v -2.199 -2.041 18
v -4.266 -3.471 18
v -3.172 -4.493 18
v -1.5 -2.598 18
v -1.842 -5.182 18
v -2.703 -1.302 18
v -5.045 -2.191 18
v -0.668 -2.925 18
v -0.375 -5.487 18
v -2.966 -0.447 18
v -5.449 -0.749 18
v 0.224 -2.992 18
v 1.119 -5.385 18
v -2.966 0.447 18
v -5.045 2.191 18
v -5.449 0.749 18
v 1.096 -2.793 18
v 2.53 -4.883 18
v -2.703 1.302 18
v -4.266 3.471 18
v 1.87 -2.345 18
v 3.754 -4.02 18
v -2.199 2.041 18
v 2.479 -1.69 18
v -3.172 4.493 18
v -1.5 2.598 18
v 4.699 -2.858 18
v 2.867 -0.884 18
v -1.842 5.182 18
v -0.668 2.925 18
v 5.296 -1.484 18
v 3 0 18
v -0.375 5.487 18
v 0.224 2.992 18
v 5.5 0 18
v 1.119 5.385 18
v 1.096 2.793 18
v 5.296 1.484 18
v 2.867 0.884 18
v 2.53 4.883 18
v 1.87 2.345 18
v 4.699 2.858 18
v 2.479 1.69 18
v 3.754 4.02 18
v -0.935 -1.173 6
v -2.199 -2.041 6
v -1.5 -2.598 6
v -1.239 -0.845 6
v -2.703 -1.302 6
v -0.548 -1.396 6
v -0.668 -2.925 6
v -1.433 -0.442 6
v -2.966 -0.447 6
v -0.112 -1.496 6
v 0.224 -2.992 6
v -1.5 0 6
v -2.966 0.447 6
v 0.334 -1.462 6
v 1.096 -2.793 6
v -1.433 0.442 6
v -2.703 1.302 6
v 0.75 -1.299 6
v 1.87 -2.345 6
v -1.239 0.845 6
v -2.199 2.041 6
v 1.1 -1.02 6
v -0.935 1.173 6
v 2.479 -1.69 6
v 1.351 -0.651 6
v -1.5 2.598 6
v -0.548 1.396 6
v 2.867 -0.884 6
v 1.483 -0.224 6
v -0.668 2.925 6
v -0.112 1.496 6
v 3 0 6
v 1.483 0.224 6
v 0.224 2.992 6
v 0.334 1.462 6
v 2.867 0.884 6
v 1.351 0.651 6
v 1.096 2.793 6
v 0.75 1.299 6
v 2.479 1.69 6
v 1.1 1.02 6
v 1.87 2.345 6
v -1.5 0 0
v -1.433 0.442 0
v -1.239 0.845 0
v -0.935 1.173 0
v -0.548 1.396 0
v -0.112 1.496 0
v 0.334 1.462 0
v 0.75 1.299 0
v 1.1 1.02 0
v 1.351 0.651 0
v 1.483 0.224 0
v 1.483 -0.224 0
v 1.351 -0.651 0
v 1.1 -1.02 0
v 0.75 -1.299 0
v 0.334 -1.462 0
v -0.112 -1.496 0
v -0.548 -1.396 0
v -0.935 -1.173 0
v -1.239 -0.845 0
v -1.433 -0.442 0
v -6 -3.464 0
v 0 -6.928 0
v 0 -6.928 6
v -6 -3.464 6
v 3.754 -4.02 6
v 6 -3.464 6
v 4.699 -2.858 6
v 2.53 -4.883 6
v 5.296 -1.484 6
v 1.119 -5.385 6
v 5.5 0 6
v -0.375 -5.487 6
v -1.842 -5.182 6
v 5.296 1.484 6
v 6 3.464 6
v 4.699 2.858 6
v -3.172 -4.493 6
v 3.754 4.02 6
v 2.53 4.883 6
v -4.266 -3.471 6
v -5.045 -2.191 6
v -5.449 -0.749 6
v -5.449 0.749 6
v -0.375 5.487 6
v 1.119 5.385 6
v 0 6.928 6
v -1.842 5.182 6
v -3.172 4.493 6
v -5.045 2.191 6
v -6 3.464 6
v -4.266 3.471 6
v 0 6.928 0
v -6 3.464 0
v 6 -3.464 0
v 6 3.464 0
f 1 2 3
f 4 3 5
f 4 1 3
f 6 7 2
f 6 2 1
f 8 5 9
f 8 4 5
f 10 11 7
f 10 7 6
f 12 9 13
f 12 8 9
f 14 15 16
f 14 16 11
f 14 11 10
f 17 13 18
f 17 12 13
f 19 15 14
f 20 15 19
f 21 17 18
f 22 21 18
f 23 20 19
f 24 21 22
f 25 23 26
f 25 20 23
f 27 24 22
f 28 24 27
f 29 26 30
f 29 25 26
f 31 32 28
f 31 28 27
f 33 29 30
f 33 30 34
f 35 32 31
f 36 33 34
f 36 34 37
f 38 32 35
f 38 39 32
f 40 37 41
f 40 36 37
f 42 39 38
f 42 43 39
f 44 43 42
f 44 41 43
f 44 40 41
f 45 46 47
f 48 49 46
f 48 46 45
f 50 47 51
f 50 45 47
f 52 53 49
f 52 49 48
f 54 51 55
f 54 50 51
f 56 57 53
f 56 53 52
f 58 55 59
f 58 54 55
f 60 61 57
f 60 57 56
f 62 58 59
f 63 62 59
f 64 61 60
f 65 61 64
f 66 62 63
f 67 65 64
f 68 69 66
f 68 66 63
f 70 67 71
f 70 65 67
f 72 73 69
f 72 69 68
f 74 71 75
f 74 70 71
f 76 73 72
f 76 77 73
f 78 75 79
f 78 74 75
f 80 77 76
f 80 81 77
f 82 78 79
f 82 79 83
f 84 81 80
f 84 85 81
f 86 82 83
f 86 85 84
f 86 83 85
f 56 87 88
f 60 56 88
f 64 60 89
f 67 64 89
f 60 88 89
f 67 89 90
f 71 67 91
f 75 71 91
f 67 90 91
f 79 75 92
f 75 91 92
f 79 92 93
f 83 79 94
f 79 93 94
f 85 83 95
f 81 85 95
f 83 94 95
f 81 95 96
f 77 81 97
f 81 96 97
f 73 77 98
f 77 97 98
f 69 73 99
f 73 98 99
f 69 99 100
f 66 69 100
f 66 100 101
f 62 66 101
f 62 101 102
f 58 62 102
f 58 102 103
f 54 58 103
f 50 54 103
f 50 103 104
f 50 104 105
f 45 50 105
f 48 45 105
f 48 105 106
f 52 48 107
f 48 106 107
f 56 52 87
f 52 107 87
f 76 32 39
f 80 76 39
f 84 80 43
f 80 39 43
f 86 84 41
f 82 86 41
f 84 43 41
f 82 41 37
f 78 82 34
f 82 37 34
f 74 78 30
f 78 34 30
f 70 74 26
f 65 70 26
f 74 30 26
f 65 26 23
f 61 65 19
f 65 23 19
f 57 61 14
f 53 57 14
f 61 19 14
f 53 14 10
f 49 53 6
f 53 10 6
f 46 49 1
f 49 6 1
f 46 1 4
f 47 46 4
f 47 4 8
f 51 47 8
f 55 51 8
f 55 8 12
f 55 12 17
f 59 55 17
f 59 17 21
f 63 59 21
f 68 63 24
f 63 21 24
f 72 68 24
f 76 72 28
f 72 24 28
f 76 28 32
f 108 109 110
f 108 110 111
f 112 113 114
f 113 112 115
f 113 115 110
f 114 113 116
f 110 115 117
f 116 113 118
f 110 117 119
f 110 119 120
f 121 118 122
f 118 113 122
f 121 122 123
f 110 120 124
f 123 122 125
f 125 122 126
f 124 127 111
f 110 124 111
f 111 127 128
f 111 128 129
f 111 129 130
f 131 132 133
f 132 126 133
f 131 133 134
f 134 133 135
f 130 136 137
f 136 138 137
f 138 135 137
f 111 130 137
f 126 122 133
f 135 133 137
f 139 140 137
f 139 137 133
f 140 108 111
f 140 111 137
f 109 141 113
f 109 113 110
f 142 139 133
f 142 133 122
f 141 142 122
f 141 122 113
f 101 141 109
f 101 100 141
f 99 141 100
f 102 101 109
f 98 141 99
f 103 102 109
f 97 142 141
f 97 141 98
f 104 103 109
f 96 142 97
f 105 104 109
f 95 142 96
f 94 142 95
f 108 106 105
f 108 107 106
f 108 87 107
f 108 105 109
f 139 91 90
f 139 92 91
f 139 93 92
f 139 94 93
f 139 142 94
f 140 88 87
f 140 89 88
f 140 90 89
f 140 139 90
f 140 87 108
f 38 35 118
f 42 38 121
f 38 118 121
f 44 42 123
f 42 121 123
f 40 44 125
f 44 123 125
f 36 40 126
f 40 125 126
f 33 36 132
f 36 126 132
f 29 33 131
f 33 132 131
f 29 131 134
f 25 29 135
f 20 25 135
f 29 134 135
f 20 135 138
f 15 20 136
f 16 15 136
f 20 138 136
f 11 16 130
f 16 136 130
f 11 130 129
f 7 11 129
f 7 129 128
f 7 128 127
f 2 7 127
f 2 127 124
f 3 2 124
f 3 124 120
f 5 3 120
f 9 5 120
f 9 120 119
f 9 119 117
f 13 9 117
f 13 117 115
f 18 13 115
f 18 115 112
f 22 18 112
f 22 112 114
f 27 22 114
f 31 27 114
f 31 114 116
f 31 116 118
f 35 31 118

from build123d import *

# Parameters (mm, degrees)
CROQUIS2_R              = 5.5
SALIENTE_EXTRUIR1_DEPTH = 18
SALIENTE_EXTRUIR2_DEPTH = 6
CROQUIS4_R              = 3
CORTAR_EXTRUIR1_DEPTH   = 12
CROQUIS5_R              = 1.5
CORTAR_EXTRUIR2_DEPTH   = 6


with BuildPart() as part:
    # Croquis2 → Saliente-Extruir1 (new body)
    with BuildSketch(Plane.XY):
        Circle(CROQUIS2_R)
    extrude(amount=SALIENTE_EXTRUIR1_DEPTH)

    # Croquis3 → Saliente-Extruir2 (add)
    with BuildSketch(Plane(origin=(0, 0, 0), x_dir=(-1, 0, 0), z_dir=(0, 0, -1))):
        Polygon((0, 6.92820323), (-6, 3.464101615), (-6, -3.464101615), (0, -6.92820323), (6, -3.464101615), (6, 3.464101615), align=None)
    extrude(amount=-SALIENTE_EXTRUIR2_DEPTH)

    # Croquis4 → Cortar-Extruir1 (cut)
    with BuildSketch(Plane.XY.offset(18)):
        Circle(CROQUIS4_R)
    extrude(amount=-CORTAR_EXTRUIR1_DEPTH, mode=Mode.SUBTRACT)

    # Croquis5 → Cortar-Extruir2 (cut)
    with BuildSketch(Plane(origin=(0, 0, 0), x_dir=(-1, 0, 0), z_dir=(0, 0, -1))):
        Circle(CROQUIS5_R)
    extrude(amount=-CORTAR_EXTRUIR2_DEPTH, mode=Mode.SUBTRACT)


solid = part.part
